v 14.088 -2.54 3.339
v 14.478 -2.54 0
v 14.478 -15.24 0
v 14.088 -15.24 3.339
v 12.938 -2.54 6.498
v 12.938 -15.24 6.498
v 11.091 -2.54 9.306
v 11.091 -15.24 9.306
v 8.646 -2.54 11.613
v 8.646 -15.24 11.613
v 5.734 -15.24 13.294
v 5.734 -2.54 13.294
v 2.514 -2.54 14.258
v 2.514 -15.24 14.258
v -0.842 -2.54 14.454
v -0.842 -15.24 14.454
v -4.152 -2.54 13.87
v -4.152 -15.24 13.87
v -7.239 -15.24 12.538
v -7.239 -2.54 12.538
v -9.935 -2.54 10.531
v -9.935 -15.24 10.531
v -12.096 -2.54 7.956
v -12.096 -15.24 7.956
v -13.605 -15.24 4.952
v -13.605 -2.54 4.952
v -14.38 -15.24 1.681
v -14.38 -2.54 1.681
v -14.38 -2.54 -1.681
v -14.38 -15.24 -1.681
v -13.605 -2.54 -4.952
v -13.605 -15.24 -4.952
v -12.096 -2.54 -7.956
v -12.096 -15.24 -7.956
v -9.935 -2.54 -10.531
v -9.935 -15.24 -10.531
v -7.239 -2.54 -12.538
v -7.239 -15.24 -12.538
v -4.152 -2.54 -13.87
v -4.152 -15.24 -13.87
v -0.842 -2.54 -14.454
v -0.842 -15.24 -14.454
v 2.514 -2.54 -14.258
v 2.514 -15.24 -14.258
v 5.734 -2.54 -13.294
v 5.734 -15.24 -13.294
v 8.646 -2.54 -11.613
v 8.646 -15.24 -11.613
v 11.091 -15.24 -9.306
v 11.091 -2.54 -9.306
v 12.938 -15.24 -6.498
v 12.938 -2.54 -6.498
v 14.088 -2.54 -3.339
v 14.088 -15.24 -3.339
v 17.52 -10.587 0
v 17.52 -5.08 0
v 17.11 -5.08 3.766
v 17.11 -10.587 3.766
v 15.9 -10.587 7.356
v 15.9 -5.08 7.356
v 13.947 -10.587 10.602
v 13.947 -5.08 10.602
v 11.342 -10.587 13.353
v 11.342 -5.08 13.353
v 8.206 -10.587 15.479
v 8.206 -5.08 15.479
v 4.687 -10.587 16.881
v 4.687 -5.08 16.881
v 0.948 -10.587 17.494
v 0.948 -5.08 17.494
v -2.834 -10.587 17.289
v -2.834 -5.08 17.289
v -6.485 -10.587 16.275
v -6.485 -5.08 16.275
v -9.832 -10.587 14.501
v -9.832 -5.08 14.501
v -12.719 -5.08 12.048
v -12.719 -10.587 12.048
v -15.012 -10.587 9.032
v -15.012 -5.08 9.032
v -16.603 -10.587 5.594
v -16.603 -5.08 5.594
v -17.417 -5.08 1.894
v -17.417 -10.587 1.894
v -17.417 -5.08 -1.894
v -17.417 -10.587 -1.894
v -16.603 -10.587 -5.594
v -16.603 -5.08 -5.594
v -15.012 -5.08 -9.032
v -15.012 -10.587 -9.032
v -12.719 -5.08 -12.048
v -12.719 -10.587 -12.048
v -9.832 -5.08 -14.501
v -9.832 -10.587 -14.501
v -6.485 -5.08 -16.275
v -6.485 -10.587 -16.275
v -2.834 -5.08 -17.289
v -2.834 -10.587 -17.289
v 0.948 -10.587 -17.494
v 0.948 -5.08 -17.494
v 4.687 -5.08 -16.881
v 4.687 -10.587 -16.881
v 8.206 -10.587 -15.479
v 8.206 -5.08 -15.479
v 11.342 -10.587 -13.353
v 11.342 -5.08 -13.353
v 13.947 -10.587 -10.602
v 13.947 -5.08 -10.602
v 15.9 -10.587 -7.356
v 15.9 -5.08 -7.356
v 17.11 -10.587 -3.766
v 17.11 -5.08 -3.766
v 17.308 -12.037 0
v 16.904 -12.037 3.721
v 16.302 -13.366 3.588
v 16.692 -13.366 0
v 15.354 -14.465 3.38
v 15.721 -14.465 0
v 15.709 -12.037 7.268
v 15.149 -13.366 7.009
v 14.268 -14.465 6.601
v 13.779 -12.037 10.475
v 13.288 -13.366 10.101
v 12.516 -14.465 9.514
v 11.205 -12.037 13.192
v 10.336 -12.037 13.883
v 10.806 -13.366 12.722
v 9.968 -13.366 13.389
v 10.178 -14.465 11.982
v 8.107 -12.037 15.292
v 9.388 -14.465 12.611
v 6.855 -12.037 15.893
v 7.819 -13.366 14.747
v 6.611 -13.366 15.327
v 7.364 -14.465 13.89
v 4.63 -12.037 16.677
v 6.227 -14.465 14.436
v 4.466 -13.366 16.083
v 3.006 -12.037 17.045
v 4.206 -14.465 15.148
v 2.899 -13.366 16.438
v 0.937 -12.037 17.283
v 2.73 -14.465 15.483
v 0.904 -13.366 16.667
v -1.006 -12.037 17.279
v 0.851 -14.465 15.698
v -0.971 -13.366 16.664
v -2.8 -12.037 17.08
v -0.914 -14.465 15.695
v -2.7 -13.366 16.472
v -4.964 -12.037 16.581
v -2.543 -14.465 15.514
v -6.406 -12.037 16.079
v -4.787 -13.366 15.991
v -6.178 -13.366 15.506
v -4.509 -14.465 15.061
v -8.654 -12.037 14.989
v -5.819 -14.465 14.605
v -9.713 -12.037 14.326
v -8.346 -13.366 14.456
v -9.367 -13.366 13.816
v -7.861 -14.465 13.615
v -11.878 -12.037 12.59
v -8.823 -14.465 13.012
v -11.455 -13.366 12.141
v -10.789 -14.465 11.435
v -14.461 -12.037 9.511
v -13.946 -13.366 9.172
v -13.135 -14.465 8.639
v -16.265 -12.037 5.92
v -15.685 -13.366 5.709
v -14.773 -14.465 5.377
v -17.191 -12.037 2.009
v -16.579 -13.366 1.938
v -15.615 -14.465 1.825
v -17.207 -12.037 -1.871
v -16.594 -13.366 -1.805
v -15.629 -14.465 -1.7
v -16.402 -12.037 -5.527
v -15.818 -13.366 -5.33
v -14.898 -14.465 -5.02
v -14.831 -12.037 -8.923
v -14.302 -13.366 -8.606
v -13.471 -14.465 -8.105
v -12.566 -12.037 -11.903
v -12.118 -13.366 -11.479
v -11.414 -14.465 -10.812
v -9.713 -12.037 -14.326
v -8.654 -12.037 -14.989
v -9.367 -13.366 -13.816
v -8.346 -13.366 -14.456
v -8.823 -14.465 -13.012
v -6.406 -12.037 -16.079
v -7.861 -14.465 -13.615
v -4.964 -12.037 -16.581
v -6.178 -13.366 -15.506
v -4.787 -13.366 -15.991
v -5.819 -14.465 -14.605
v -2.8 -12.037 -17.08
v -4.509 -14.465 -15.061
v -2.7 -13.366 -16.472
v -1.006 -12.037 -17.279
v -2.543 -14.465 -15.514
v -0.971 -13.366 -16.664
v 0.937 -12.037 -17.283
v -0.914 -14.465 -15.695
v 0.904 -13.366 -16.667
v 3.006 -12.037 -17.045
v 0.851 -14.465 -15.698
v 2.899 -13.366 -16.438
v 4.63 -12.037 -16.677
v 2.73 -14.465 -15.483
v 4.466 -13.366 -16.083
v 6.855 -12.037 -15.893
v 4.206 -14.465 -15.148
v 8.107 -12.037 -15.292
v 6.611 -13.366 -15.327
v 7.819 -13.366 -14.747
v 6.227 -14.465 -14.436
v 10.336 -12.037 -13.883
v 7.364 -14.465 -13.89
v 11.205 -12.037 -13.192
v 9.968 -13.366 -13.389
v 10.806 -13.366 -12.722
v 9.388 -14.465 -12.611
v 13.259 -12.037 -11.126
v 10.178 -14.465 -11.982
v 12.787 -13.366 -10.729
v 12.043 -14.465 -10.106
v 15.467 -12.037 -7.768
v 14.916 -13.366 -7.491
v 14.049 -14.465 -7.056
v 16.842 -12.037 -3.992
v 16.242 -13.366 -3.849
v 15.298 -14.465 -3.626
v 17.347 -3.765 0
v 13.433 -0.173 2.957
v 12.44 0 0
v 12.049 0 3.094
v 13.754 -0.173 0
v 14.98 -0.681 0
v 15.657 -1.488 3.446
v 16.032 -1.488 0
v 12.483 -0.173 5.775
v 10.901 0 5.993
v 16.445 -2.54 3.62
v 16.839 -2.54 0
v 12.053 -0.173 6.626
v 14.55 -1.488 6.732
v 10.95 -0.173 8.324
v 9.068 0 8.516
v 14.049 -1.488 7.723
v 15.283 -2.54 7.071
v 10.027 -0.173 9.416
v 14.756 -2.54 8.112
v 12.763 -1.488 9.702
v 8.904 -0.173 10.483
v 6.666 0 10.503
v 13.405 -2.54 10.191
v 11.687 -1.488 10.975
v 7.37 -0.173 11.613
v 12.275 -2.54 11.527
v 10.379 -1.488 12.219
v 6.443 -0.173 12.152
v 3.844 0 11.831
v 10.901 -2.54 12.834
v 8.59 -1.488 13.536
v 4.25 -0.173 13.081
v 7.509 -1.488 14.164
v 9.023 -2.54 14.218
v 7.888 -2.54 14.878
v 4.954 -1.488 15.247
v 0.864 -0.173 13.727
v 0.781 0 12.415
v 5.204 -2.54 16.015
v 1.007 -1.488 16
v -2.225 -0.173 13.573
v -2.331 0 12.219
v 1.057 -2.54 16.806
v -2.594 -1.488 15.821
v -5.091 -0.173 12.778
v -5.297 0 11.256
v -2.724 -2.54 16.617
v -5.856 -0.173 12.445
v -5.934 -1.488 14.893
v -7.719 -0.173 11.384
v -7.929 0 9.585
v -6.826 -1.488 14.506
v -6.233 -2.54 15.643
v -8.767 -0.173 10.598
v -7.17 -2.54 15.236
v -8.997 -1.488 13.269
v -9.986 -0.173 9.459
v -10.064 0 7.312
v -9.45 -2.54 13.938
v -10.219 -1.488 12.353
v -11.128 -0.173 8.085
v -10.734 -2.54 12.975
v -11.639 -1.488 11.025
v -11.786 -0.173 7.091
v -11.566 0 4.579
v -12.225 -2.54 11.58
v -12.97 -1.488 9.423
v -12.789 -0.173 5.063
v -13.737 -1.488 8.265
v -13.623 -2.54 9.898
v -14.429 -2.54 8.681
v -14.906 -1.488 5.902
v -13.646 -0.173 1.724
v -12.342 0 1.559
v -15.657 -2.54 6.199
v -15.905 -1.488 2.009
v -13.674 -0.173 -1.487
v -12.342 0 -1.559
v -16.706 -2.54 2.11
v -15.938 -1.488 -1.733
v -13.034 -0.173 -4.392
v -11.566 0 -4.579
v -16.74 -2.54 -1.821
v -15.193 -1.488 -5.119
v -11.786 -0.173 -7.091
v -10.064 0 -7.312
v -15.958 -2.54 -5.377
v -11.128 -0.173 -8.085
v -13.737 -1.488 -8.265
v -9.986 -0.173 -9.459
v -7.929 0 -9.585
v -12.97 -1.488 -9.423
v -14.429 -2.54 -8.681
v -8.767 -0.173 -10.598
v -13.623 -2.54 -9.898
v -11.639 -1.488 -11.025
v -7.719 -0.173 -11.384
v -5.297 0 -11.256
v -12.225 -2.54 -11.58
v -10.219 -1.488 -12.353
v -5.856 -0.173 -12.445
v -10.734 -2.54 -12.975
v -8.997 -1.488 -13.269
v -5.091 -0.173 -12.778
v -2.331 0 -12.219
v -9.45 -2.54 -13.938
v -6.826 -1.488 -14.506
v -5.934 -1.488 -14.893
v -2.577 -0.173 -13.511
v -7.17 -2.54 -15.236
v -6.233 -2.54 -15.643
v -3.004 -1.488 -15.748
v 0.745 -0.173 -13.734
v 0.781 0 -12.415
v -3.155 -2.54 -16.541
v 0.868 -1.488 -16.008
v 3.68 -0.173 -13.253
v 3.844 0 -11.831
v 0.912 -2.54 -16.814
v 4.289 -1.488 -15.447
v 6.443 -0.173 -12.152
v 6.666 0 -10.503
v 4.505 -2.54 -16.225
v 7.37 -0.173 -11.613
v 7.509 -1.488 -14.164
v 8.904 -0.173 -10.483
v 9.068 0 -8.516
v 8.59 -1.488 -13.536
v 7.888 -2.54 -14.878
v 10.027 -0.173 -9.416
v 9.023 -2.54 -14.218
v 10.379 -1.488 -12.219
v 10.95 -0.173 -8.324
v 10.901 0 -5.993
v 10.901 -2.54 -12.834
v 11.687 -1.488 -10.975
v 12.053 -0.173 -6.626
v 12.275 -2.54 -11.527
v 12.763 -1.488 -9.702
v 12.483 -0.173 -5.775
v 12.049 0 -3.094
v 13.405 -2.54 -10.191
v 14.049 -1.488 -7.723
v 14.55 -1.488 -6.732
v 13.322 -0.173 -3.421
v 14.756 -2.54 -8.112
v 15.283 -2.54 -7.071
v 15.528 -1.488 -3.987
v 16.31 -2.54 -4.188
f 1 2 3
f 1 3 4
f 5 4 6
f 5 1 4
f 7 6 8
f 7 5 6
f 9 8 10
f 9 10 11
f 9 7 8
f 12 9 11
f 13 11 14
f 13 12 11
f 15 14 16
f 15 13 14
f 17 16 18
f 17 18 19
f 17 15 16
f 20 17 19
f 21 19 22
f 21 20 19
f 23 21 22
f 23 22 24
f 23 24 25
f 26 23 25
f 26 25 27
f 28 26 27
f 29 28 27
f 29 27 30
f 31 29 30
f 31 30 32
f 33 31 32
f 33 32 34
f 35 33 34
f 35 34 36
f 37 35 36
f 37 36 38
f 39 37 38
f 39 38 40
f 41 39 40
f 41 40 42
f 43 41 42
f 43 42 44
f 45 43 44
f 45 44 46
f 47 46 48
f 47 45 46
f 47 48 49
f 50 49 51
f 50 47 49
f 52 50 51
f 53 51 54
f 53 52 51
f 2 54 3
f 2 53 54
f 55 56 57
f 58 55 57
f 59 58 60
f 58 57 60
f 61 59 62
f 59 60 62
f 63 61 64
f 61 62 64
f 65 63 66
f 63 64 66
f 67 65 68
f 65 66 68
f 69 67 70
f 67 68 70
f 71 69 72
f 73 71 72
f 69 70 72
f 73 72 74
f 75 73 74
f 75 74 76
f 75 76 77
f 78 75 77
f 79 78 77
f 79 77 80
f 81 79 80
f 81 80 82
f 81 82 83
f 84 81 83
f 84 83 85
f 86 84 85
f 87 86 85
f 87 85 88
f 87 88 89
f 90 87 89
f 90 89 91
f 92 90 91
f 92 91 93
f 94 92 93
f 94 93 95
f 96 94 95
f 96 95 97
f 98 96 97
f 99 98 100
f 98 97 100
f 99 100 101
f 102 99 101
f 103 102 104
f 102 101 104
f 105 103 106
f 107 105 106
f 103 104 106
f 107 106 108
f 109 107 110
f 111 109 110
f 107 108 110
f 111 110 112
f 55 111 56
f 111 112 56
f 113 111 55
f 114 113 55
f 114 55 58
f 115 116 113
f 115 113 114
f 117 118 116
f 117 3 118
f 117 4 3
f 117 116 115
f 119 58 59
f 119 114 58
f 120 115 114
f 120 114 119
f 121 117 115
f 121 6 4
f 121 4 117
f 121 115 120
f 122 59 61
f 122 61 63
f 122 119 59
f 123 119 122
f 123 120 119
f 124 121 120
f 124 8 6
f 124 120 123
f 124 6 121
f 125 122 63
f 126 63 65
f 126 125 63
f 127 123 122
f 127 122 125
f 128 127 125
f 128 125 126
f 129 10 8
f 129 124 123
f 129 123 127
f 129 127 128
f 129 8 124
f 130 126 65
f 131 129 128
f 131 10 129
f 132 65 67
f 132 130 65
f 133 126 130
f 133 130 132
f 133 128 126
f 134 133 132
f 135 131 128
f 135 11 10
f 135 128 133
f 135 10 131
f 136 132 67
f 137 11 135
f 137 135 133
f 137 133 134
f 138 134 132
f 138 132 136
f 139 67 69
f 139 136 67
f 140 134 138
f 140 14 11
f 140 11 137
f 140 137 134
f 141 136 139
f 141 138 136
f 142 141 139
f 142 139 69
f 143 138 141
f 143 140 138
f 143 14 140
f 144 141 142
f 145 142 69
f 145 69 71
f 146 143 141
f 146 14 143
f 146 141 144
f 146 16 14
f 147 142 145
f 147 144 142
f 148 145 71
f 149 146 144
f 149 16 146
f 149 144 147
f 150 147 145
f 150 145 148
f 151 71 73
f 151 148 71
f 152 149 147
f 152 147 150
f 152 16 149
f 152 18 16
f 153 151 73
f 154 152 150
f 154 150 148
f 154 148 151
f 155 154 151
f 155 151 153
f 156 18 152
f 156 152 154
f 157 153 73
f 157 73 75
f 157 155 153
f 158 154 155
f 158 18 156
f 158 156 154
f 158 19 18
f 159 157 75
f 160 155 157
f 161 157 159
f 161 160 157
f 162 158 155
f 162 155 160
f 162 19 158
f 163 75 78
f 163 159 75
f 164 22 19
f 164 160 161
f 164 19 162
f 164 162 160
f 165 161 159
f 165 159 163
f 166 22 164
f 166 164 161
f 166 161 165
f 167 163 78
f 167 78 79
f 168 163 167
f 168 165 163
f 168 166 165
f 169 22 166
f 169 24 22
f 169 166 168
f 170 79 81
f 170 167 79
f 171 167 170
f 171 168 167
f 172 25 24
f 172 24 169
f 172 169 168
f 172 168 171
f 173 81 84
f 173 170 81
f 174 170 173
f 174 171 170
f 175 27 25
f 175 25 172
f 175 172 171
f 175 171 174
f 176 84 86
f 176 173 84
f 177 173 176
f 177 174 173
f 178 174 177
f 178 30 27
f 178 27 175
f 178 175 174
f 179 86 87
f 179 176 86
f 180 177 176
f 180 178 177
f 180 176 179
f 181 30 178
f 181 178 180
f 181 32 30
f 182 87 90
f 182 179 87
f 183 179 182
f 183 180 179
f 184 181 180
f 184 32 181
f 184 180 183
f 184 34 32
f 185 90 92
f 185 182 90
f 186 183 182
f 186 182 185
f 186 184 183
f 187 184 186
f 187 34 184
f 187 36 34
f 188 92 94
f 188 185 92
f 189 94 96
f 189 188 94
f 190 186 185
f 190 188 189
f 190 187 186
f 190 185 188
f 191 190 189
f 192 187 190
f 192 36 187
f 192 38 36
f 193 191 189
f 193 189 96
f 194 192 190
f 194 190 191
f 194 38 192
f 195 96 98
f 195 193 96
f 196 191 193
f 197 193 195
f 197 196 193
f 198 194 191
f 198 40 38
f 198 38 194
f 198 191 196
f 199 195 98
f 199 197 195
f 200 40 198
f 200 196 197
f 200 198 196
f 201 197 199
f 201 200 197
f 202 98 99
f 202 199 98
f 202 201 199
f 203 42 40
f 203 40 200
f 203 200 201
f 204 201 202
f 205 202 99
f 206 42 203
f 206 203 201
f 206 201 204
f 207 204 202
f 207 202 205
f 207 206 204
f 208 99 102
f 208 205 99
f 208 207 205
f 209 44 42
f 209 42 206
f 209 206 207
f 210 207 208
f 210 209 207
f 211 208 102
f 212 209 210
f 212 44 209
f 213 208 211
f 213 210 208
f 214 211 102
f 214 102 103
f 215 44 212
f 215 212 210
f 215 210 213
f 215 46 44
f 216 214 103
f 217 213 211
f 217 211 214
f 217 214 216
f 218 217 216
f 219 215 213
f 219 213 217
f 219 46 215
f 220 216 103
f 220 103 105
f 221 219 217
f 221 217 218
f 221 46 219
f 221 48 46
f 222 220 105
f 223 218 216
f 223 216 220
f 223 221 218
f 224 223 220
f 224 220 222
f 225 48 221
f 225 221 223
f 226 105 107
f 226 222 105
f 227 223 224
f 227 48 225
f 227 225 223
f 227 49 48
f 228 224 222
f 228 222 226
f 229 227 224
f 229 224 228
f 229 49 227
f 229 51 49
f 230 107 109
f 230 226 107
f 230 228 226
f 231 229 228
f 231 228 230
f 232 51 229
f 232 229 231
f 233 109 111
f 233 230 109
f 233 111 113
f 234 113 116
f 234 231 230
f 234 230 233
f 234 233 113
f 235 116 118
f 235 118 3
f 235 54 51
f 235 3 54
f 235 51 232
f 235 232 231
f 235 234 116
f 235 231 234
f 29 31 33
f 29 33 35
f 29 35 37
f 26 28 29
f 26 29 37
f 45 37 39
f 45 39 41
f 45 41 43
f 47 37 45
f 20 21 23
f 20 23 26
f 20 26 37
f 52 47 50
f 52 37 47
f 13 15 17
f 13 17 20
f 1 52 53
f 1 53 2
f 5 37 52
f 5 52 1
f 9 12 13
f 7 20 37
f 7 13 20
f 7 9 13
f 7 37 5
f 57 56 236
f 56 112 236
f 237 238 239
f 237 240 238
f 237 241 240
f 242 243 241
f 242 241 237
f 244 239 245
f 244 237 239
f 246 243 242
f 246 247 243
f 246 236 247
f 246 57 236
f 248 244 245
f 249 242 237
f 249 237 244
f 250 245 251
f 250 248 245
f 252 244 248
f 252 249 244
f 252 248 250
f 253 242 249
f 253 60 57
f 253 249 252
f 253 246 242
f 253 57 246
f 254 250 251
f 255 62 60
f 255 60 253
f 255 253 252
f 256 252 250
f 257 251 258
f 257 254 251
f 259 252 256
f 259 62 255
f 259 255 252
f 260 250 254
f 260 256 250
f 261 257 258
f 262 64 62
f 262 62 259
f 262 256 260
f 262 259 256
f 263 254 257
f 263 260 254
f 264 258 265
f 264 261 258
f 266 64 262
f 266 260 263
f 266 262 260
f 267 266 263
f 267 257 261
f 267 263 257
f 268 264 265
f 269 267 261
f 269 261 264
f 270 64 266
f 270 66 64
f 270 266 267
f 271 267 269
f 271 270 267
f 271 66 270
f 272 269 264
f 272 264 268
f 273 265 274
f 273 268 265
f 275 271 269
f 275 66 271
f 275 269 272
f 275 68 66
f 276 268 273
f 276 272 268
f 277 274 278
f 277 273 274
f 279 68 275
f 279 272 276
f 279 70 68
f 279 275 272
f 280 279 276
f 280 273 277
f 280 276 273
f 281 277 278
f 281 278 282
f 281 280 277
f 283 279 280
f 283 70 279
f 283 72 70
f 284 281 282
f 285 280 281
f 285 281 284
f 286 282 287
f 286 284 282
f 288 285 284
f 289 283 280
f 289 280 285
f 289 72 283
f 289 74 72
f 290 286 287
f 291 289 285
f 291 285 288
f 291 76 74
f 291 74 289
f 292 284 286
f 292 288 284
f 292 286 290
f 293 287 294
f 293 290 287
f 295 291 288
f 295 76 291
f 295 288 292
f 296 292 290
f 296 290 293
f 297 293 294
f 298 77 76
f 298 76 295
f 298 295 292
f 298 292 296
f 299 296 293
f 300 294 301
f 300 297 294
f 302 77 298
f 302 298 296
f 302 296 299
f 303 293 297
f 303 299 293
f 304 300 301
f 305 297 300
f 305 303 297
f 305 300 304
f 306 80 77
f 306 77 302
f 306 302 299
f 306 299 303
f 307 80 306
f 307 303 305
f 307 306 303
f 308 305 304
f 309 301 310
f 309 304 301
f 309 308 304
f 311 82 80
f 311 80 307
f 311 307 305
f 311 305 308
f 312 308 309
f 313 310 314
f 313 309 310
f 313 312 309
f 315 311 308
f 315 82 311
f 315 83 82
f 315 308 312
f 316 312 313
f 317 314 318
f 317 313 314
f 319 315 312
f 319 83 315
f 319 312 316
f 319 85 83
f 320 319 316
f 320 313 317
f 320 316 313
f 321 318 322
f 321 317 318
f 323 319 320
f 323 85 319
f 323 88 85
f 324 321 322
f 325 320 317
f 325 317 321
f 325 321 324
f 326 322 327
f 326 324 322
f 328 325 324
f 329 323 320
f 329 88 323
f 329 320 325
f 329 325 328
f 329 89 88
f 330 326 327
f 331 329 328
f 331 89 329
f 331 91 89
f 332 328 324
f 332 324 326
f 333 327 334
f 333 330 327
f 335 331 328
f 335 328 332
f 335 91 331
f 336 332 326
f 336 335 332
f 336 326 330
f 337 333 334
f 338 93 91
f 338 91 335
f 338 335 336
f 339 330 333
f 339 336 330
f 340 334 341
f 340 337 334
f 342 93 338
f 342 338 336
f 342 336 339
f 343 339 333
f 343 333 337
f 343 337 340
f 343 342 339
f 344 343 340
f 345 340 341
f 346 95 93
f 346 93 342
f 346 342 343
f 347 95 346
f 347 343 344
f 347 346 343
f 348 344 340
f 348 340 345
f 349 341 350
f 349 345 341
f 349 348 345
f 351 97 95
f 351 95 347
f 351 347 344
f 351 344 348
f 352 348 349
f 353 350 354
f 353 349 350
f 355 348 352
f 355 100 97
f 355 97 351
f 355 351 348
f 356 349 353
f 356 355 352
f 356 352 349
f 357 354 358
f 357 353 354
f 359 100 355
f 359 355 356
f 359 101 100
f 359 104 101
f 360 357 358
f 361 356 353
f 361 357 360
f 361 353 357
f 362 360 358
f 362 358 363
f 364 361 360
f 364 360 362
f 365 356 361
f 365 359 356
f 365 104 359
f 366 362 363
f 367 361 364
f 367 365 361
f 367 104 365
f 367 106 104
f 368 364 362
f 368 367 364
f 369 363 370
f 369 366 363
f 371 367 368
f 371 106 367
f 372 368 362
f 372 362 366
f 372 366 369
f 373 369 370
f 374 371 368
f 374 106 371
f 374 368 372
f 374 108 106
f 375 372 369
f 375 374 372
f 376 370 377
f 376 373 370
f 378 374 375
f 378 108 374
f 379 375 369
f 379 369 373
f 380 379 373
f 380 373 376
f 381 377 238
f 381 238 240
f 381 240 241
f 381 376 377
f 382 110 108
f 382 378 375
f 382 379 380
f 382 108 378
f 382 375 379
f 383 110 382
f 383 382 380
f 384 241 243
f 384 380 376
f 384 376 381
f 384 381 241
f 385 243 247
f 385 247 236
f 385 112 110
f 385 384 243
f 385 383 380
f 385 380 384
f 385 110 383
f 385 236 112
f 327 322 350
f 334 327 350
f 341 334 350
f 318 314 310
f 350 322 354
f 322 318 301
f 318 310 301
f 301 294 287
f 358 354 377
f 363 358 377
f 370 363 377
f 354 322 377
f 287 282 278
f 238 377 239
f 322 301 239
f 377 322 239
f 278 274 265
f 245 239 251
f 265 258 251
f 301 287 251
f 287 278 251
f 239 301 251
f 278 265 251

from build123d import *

# Parameters (mm, degrees)
F0_R     = 14.478
F1_DEPTH = 2.54
F0_R_2   = 17.5196905757
F2_DEPTH = 15.24


# Not quite as in the source:
# - a fillet or chamfer that OpenCascade refuses, or shapes differently, is made with other operations: its cross-section is extruded or revolved along the edge and cut away or added


with BuildPart() as f1:
    # F0 (on Front) → F1 (new body)
    with BuildSketch(Plane.XZ):
        Circle(F0_R)
    extrude(amount=F1_DEPTH)

    # F0 (on Front) → F2 (join)
    with BuildSketch(Plane.XZ):
        Circle(F0_R_2)
        Circle(F0_R, mode=Mode.SUBTRACT)
    extrude(amount=F2_DEPTH)

    # F3: fillet of radius 5.08 on 3 edges, made by hand

    # F3_s1 → F3_t2 (revolve, cut)
    with BuildSketch(Plane.XY):
        with BuildLine():
            ThreePointArc((12.4396905757, 0), (16.0317930242, -1.4878975516), (17.5196905757, -5.08))
            Line((17.5196905757, -5.08), (17.6212905757, -5.08))
            Line((17.6212905757, -5.08), (17.6212905757, 0.1016))
            Line((17.6212905757, 0.1016), (12.4396905757, 0.1016))
            Line((12.4396905757, 0.1016), (12.4396905757, 0))
        make_face()
    revolve(axis=Axis((0, 0, 0), (0, -1, 0)), mode=Mode.SUBTRACT)

    # F3_s3 → F3_t4 (revolve, cut)
    with BuildSketch(Plane.XY):
        with BuildLine():
            ThreePointArc((17.5196905757, -10.5868618448), (16.6918083937, -13.3664111001), (14.478, -15.24))
            Line((14.478, -15.24), (14.5187661885, -15.3330627631))
            ThreePointArc((14.5187661885, -15.3330627631), (15.9988452879, -15.3416), (17.5196905757, -15.3416))
            Line((17.5196905757, -15.3416), (17.6212905757, -15.24))
            Line((17.6212905757, -15.24), (17.6212905757, -10.5868618448))
            Line((17.6212905757, -10.5868618448), (17.5196905757, -10.5868618448))
        make_face()
    revolve(axis=Axis((0, -15.24, 0), (0, -1, 0)), mode=Mode.SUBTRACT)


solid = f1.part
